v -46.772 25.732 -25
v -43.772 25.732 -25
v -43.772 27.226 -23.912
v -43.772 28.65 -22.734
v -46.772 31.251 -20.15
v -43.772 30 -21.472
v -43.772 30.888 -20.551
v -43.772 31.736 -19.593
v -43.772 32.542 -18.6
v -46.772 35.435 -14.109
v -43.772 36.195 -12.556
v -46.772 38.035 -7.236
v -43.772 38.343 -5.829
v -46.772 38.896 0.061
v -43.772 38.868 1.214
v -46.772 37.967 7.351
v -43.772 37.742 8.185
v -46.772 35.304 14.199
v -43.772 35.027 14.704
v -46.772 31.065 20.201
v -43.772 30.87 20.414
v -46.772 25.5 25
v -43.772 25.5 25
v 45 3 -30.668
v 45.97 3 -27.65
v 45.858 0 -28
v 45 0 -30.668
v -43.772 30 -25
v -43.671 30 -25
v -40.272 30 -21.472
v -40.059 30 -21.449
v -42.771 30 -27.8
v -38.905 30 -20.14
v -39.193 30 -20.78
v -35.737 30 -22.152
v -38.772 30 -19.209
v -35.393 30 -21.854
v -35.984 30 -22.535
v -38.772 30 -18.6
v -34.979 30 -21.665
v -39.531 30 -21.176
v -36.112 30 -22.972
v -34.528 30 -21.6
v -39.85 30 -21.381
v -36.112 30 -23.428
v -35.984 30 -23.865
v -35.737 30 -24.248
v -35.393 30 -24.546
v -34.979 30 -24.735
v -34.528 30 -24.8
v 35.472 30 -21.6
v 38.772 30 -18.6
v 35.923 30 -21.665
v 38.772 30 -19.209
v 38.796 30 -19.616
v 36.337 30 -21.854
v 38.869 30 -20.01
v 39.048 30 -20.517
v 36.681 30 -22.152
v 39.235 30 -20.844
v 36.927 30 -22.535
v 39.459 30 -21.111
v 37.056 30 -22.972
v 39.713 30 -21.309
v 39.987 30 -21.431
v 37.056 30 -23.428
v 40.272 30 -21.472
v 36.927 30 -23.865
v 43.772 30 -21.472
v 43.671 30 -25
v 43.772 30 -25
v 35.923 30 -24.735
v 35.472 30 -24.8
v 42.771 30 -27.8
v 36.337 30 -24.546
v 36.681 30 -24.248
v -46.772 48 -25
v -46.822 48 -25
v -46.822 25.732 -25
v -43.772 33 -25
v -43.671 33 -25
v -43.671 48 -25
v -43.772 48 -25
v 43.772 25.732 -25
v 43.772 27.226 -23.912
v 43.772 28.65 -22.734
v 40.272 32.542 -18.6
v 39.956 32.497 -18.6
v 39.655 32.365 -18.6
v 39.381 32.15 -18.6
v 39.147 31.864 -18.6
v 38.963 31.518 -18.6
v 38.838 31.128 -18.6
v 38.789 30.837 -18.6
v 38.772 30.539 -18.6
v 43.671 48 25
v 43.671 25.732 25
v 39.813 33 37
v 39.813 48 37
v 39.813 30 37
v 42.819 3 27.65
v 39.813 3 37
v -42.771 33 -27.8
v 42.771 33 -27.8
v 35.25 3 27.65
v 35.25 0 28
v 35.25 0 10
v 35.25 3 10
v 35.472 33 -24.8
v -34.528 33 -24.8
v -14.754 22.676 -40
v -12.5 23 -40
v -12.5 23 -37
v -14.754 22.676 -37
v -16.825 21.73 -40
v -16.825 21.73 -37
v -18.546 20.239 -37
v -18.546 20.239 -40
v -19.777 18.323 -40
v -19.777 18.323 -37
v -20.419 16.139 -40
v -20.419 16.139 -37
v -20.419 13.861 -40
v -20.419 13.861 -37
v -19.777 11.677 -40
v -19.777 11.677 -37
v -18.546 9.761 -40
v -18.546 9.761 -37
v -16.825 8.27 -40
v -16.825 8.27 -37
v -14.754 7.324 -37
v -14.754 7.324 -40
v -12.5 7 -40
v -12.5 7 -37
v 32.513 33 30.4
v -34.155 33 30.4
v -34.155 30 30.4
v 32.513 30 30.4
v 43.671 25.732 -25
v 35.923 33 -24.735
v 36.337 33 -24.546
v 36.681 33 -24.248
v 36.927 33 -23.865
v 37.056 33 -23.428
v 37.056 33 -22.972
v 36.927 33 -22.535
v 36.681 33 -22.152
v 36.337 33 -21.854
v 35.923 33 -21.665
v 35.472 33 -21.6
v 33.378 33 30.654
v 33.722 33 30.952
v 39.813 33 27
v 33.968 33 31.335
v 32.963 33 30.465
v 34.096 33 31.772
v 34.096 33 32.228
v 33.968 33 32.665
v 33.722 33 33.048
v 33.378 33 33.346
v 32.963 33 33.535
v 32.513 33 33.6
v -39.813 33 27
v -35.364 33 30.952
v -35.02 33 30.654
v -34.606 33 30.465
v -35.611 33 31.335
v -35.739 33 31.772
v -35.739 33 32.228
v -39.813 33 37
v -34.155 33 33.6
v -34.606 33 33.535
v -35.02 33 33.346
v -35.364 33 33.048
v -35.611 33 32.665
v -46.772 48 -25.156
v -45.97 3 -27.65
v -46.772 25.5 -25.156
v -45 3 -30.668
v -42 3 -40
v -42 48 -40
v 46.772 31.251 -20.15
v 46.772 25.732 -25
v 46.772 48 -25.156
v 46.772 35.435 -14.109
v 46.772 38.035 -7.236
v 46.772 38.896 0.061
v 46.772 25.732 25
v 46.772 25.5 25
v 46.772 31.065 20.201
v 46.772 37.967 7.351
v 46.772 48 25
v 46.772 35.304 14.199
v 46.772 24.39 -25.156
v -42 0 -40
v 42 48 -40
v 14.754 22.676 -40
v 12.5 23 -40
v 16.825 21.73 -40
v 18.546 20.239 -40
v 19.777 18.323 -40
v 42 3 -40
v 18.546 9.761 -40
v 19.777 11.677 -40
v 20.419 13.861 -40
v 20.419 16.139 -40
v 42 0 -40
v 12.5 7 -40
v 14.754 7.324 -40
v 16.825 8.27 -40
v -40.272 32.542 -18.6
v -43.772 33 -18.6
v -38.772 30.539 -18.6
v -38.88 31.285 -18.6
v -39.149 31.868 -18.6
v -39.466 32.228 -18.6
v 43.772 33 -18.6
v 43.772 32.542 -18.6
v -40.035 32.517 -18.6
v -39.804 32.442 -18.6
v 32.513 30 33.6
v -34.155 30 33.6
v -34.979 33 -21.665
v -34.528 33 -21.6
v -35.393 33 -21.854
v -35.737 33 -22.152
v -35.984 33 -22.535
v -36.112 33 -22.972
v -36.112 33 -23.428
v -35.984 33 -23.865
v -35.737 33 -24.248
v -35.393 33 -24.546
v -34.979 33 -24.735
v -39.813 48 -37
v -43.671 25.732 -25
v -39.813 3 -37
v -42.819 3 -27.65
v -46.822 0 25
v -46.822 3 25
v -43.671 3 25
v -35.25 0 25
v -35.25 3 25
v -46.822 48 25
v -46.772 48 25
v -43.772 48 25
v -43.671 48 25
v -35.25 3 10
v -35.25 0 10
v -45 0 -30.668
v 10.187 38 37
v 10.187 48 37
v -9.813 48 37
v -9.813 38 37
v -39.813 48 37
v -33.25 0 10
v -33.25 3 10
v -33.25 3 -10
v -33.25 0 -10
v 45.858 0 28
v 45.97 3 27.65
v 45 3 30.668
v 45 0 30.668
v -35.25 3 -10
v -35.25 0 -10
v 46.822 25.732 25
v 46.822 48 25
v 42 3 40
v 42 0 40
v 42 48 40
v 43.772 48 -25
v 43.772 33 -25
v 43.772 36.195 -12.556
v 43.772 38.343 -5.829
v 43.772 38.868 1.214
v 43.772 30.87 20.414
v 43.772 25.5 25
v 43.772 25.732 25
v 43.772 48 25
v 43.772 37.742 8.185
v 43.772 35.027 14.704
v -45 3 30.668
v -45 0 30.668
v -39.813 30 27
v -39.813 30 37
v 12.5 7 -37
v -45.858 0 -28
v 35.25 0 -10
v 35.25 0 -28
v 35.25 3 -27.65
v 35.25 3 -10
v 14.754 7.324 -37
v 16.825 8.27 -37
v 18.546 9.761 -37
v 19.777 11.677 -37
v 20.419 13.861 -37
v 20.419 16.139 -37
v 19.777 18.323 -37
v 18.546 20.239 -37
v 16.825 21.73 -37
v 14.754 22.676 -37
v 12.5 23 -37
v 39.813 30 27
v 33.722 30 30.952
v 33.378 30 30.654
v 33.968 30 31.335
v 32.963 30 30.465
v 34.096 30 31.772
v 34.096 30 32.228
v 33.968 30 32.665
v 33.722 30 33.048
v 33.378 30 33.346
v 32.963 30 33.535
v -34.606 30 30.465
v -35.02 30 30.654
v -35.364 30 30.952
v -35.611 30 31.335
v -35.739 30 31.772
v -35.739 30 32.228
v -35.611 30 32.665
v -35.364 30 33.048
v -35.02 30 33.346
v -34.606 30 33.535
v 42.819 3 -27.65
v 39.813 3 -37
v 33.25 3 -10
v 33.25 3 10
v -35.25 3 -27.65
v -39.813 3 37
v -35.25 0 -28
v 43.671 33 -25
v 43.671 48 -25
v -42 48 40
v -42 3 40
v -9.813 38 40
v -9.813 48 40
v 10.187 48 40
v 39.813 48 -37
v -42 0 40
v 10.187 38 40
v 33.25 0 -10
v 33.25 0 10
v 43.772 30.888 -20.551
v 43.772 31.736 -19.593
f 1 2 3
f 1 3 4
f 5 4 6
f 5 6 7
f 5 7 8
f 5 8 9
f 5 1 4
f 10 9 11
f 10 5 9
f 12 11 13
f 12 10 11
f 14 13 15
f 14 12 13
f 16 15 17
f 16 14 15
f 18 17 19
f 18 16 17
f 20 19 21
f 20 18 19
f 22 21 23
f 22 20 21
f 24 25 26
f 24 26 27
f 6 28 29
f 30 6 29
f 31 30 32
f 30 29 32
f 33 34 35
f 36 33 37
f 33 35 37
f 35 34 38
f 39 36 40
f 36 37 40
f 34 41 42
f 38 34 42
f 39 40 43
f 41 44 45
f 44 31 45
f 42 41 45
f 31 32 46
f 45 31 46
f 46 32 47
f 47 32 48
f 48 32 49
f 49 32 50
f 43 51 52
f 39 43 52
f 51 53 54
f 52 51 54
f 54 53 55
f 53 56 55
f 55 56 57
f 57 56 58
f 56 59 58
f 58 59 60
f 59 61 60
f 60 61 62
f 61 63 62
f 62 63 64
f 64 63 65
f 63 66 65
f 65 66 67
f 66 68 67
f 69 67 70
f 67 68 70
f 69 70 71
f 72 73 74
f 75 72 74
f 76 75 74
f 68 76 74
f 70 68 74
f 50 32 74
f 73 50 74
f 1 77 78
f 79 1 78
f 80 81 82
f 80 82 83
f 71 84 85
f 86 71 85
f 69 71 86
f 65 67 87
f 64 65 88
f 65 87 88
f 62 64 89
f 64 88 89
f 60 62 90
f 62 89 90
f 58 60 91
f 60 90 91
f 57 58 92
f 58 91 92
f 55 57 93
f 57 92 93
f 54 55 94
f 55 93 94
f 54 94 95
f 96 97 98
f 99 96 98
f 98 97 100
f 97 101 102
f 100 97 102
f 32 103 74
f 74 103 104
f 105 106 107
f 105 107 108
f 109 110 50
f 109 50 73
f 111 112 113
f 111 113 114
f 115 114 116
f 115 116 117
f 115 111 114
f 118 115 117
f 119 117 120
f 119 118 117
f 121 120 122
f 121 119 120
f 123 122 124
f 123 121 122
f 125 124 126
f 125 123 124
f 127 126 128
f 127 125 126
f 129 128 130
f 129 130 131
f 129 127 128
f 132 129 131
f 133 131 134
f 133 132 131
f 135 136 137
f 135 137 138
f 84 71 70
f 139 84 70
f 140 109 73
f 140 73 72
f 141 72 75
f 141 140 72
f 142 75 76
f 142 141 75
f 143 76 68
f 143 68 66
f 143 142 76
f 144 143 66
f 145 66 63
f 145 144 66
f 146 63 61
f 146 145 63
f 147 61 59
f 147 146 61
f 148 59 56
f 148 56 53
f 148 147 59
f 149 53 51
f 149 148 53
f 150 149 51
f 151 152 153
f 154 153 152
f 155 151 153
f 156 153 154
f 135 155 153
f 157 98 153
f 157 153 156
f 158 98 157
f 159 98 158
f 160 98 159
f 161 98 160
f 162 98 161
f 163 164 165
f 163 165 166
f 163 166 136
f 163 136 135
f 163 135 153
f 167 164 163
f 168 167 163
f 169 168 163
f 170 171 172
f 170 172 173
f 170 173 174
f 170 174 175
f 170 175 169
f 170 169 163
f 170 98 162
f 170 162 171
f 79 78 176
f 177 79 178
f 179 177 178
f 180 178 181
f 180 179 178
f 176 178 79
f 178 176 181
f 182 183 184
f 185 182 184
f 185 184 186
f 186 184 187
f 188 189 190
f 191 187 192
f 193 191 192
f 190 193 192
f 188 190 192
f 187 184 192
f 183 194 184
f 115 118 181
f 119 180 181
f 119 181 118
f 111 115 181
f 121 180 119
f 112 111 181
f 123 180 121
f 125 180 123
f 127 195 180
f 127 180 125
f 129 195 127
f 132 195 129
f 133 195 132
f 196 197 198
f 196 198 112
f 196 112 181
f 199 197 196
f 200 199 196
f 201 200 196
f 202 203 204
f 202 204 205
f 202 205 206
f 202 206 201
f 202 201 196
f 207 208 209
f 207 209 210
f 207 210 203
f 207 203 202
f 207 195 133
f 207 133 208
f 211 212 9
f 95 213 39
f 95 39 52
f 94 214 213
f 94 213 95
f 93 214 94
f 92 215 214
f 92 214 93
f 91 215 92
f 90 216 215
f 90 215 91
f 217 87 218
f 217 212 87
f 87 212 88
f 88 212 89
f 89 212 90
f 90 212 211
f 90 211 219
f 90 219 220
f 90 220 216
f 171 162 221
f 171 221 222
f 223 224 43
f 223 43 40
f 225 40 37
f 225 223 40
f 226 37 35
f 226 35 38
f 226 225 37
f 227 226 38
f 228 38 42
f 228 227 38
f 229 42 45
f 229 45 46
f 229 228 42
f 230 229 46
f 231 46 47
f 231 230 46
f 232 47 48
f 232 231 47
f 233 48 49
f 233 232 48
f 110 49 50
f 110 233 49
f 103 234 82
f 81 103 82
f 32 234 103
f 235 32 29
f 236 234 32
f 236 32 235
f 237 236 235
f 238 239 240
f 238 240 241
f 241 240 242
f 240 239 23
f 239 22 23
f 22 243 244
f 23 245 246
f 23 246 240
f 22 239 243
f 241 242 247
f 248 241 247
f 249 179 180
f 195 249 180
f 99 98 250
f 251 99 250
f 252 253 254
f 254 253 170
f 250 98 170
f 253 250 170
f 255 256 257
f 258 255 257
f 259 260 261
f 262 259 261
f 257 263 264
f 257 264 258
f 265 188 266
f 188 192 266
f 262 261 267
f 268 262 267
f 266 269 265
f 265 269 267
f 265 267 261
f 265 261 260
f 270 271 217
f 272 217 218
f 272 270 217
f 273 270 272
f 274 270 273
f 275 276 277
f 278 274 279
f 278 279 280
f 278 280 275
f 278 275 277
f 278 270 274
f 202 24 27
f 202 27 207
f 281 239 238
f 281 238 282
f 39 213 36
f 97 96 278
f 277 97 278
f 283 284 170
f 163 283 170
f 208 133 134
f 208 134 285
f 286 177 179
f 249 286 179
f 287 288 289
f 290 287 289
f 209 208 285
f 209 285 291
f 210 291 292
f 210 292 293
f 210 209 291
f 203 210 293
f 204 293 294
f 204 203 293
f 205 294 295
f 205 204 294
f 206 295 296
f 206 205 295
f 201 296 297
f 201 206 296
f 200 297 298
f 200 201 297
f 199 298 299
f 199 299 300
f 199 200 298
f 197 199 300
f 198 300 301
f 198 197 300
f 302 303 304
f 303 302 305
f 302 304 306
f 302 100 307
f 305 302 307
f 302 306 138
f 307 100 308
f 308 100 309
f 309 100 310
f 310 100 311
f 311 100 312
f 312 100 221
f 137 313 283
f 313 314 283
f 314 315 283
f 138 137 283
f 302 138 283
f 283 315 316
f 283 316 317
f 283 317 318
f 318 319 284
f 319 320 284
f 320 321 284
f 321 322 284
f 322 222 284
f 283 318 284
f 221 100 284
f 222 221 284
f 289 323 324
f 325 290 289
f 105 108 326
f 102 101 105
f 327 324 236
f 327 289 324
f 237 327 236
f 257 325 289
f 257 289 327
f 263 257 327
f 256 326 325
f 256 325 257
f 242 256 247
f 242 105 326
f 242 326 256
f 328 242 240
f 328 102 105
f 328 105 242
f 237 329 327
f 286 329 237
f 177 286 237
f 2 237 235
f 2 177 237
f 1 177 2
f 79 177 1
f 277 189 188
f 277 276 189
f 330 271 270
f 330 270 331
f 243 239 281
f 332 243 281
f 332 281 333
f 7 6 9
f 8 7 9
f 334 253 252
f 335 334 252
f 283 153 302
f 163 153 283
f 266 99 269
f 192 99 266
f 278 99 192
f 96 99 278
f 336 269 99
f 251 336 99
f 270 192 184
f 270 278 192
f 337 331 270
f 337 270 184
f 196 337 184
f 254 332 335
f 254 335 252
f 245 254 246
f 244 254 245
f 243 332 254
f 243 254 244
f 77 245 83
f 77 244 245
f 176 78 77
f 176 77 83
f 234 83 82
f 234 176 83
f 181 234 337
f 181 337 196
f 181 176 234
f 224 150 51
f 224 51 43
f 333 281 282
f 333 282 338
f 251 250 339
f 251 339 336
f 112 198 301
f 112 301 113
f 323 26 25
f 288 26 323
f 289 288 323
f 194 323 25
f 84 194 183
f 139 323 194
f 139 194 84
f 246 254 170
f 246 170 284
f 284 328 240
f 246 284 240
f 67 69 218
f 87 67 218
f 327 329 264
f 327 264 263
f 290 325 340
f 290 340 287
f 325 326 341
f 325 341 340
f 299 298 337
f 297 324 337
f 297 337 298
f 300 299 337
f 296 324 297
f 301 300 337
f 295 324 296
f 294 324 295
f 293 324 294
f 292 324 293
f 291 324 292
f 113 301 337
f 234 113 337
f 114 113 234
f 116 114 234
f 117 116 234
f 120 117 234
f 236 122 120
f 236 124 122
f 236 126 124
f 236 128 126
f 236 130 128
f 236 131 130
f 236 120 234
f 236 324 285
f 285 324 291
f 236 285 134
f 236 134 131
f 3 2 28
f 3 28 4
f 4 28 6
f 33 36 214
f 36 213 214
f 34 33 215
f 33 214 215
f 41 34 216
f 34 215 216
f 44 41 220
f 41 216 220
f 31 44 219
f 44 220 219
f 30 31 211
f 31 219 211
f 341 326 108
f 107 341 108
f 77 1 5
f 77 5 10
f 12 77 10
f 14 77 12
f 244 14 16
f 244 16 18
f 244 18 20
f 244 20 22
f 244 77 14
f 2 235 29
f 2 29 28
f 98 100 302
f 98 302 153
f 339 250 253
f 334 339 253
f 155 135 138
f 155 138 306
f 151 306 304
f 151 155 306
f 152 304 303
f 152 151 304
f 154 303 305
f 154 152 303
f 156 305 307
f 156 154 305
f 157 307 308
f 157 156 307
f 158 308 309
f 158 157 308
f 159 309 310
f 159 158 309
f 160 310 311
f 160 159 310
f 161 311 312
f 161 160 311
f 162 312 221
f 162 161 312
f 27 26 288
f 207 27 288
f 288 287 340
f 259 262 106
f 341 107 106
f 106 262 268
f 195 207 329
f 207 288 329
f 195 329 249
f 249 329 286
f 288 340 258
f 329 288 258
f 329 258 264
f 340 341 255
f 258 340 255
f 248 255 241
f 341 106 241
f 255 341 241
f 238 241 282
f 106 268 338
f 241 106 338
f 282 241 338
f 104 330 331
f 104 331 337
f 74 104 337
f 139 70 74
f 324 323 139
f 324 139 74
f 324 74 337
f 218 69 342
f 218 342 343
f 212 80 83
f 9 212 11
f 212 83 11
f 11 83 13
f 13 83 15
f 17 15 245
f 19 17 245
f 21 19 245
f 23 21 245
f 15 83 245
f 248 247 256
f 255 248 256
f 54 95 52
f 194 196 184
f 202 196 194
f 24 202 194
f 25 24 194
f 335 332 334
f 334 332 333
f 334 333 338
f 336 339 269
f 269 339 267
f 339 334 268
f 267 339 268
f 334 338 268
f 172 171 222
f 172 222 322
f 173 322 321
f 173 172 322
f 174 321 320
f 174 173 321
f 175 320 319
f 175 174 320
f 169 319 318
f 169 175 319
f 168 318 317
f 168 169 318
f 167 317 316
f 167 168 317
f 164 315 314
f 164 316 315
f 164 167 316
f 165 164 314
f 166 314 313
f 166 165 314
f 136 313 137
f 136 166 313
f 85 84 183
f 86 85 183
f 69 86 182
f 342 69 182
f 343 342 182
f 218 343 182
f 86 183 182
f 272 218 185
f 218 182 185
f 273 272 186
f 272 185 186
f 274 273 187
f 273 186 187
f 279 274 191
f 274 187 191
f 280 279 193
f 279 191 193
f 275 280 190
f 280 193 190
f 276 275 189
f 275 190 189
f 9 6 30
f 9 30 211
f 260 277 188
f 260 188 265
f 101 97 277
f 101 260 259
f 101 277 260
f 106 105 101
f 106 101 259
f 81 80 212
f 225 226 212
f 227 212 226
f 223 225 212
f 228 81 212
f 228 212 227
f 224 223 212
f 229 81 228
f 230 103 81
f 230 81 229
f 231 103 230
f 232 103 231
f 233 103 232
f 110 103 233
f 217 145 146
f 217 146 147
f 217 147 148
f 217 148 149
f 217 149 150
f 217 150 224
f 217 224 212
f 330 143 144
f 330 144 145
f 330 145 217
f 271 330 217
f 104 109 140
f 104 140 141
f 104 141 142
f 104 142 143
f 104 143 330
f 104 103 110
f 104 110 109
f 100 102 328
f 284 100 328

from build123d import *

# Parameters (mm, degrees)
SKETCH1_W            = 90
SKETCH1_H            = 80
BOSS_EXTRUDE1_DEPTH  = 3
SKETCH2_W            = 11.75
SKETCH2_H            = 50
CUT_EXTRUDE1_DEPTH   = 3
SKETCH3_W            = 2
SKETCH3_H            = 15
BOSS_EXTRUDE2_DEPTH  = 3
BOSS_EXTRUDE3_DEPTH  = 3
CUT_EXTRUDE2_DEPTH   = 3
BOSS_EXTRUDE4_DEPTH  = 45
BOSS_EXTRUDE5_DEPTH  = 3
CUT_EXTRUDE3_DEPTH   = 3
CUT_EXTRUDE6_START   = -93.59401
CUT_EXTRUDE6_DEPTH   = 93.644295
MIRROR4_START        = 35.25
MIRROR4_DEPTH        = 11.572147393
SKETCH17_W           = 70.5
SKETCH17_H           = 3
BOSS_EXTRUDE10_DEPTH = 3
SKETCH19_W           = 79.626439034
SKETCH19_H           = 3
BOSS_EXTRUDE11_DEPTH = 10
CUT_EXTRUDE7_DEPTH   = 10
SKETCH22_W           = 87.543724768
SKETCH22_H           = 9.2
BOSS_EXTRUDE12_DEPTH = 3
CUT_EXTRUDE8_DEPTH   = 5
CUT_EXTRUDE9_DEPTH   = 5
FILLET4_R            = 1.5
FILLET6_R            = 1.5
SKETCH26_W           = 20
SKETCH26_H           = 10
CUT_EXTRUDE10_DEPTH  = 5


# Read off the part's stored shape, not the designer's step: Mirror4
with BuildPart() as part:
    # Sketch1 → Boss-Extrude1 (new body)
    with BuildSketch(Plane(origin=(0, 0, 0), x_dir=(1, 0, 0), z_dir=(0, 1, 0))):
        Rectangle(SKETCH1_W, SKETCH1_H)
    extrude(amount=BOSS_EXTRUDE1_DEPTH)

    # Sketch2 → Cut-Extrude1 (cut)
    with BuildSketch(Plane(origin=(0, 3, 0), x_dir=(1, 0, 0), z_dir=(0, 1, 0))):
        with Locations((-39.125, 0)):
            Rectangle(SKETCH2_W, SKETCH2_H)
        with Locations((39.125, 0)):
            Rectangle(SKETCH2_W, SKETCH2_H)
    extrude(amount=-CUT_EXTRUDE1_DEPTH, mode=Mode.SUBTRACT)

    # Sketch3 → Boss-Extrude2 (add)
    with BuildSketch(Plane(origin=(0, 3, 0), x_dir=(1, 0, 0), z_dir=(0, 1, 0))):
        with Locations((-34.25, -17.5)):
            Rectangle(SKETCH3_W, SKETCH3_H)
        with Locations((-34.25, 17.5)):
            Rectangle(SKETCH3_W, SKETCH3_H)
        with Locations((34.25, -17.5)):
            Rectangle(SKETCH3_W, SKETCH3_H)
        with Locations((34.25, 17.5)):
            Rectangle(SKETCH3_W, SKETCH3_H)
    extrude(amount=-BOSS_EXTRUDE2_DEPTH)

    # Sketch4 → Boss-Extrude3 (add)
    with BuildSketch(Plane(origin=(0, 3, 0), x_dir=(1, 0, 0), z_dir=(0, 1, 0))):
        Polygon((-45, 25), (-46.822147393, 25), (-45, 30.668057955), align=None)
        Polygon((45, 25), (46.822147393, 25), (45, 30.668057955), align=None)
        Polygon((-45, -25), (-46.822147393, -25), (-45, -30.668057955), align=None)
        Polygon((45, -25), (46.822147393, -25), (45, -30.668057955), align=None)
    extrude(amount=-BOSS_EXTRUDE3_DEPTH)

    # Sketch5 → Cut-Extrude2 (cut)
    with BuildSketch(Plane(origin=(0, 3, 0), x_dir=(1, 0, 0), z_dir=(0, 1, 0))):
        Polygon((-45, 30.668057955), (-42, 40), (-45, 40), align=None)
        Polygon((45, 30.668057955), (42, 40), (45, 40), align=None)
        Polygon((45, -40), (45, -30.668057955), (42, -40), align=None)
        Polygon((-45, -40), (-45, -30.668057955), (-42, -40), align=None)
    extrude(amount=-CUT_EXTRUDE2_DEPTH, mode=Mode.SUBTRACT)

    # Sketch6 → Boss-Extrude4 (add)
    with BuildSketch(Plane(origin=(0, 3, 0), x_dir=(1, 0, 0), z_dir=(0, 1, 0))):
        Polygon((39.813219517, 37), (-39.813219517, 37), (-43.670937432, 25), (-46.822147393, 25), (-42, 40), (42, 40), (46.771862384, 25.156418928), (46.771862384, 25), (43.670937432, 25), align=None)
        Polygon((43.670937432, -25), (39.813219517, -37), (-39.813219517, -37), (-43.670937432, -25), (-46.822147393, -25), (-42, -40), (42, -40), (46.822147393, -25), align=None)
    extrude(amount=BOSS_EXTRUDE4_DEPTH)

    # Sketch7 → Boss-Extrude5 (add)
    with BuildSketch(Plane(origin=(46.771862384, 0, 0), x_dir=(0, 0, -1), z_dir=(1, 0, 0))):
        with BuildLine():
            Line((-25, 25.5), (-25, 48))
            Line((-25, 48), (25.156418928, 48))
            Line((25.156418928, 48), (25.156418928, 25.5))
            ThreePointArc((25.156418928, 25.5), (0.078209464, 38.896159305), (-25, 25.5))
        make_face()
    boss_extrude5 = extrude(amount=-BOSS_EXTRUDE5_DEPTH)

    # Mirror1: Boss-Extrude5 across plane
    add(boss_extrude5.mirror(Plane.ZY))

    # Sketch10 → Cut-Extrude3 (cut)
    with BuildSketch(Plane(origin=(0, 0, -40), x_dir=(-1, 0, 0), z_dir=(0, 0, -1))):
        with BuildLine():
            Line((-12.5, 23), (12.5, 23))
            ThreePointArc((12.5, 23), (20.5, 15), (12.5, 7))
            Line((12.5, 7), (-12.5, 7))
            ThreePointArc((-12.5, 7), (-20.5, 15), (-12.5, 23))
        make_face()
    extrude(amount=-CUT_EXTRUDE3_DEPTH, mode=Mode.SUBTRACT)

    # Sketch15 → Cut-Extrude6 (cut)
    with BuildSketch(Plane(origin=(46.771862384, 0, 0), x_dir=(0, 0, -1), z_dir=(1, 0, 0)).offset(CUT_EXTRUDE6_START)):
        Polygon((25, 25.731506228), (25, 0), (28, 0), align=None)
    cut_extrude6 = extrude(amount=CUT_EXTRUDE6_DEPTH, mode=Mode.SUBTRACT)

    # Mirror3: Cut-Extrude6 across plane
    add(cut_extrude6.mirror(Plane.ZY), mode=Mode.SUBTRACT)

    # Mirror4 outline → Mirror4 (cut)
    with BuildSketch(Plane.YZ.offset(MIRROR4_START)):
        Polygon((25.731506228, 25), (0, 28), (0, 25), align=None)
    extrude(amount=MIRROR4_DEPTH, mode=Mode.SUBTRACT)

    # Sketch17 → Boss-Extrude10 (add)
    with BuildSketch(Plane(origin=(0, 0, -25), x_dir=(-1, 0, 0), z_dir=(0, 0, -1))):
        with Locations((0, 1.5)):
            Rectangle(SKETCH17_W, SKETCH17_H)
    extrude(amount=BOSS_EXTRUDE10_DEPTH)

    # Sketch19 → Boss-Extrude11 (add)
    with BuildSketch(Plane(origin=(0, 0, 37), x_dir=(-1, 0, 0), z_dir=(0, 0, -1))):
        with Locations((0, 31.5)):
            Rectangle(SKETCH19_W, SKETCH19_H)
    extrude(amount=BOSS_EXTRUDE11_DEPTH)

    # Sketch21 → Cut-Extrude7 (cut)
    with BuildSketch(Plane(origin=(0, 33, 0), x_dir=(1, 0, 0), z_dir=(0, 1, 0))):
        with BuildLine():
            Line((-34.155163783, -30.4), (32.512648359, -30.4))
            ThreePointArc((32.512648359, -30.4), (34.112648359, -32), (32.512648359, -33.6))
            Line((32.512648359, -33.6), (-34.155163783, -33.6))
            ThreePointArc((-34.155163783, -33.6), (-35.755163783, -32), (-34.155163783, -30.4))
        make_face()
    extrude(amount=-CUT_EXTRUDE7_DEPTH, mode=Mode.SUBTRACT)

    # Sketch22 → Boss-Extrude12 (add)
    with BuildSketch(Plane(origin=(0, 33, 0), x_dir=(1, 0, 0), z_dir=(0, 1, 0))):
        with Locations((0, 23.2)):
            Rectangle(SKETCH22_W, SKETCH22_H)
        with BuildLine():
            Line((-34.528137616, 24.8), (35.471862384, 24.8))
            ThreePointArc((35.471862384, 24.8), (37.071862384, 23.2), (35.471862384, 21.6))
            Line((35.471862384, 21.6), (-34.528137616, 21.6))
            ThreePointArc((-34.528137616, 21.6), (-36.128137616, 23.2), (-34.528137616, 24.8))
        make_face(mode=Mode.SUBTRACT)
    extrude(amount=-BOSS_EXTRUDE12_DEPTH)

    # Sketch24 → Cut-Extrude8 (cut)
    with BuildSketch(Plane.ZY.offset(43.771862384)):
        Polygon((-18.6, 32.542028326), (-18.6, 30), (-21.471793131, 30), align=None)
    extrude(amount=-CUT_EXTRUDE8_DEPTH, mode=Mode.SUBTRACT)

    # Sketch25 → Cut-Extrude9 (cut)
    with BuildSketch(Plane(origin=(43.771862384, 0, 0), x_dir=(0, 0, -1), z_dir=(1, 0, 0))):
        Polygon((18.6, 32.542028326), (18.6, 30), (21.471793131, 30), align=None)
    extrude(amount=-CUT_EXTRUDE9_DEPTH, mode=Mode.SUBTRACT)

    # Fillet4
    fillet4_edges = [part.edges().sort_by_distance(p)[0] for p in [
        (38.771862384, 31.271014163, -20.035896565),
    ]]
    fillet(fillet4_edges, radius=FILLET4_R)

    # Fillet6
    fillet6_edges = [part.edges().sort_by_distance(p)[0] for p in [
        (-38.771862384, 31.271014163, -20.035896565),
    ]]
    fillet(fillet6_edges, radius=FILLET6_R)

    # Sketch26 → Cut-Extrude10 (cut)
    with BuildSketch(Plane(origin=(0, 0, 37), x_dir=(-1, 0, 0), z_dir=(0, 0, -1))):
        with Locations((-0.186780483, 43)):
            Rectangle(SKETCH26_W, SKETCH26_H)
    extrude(amount=-CUT_EXTRUDE10_DEPTH, mode=Mode.SUBTRACT)


solid = part.part
